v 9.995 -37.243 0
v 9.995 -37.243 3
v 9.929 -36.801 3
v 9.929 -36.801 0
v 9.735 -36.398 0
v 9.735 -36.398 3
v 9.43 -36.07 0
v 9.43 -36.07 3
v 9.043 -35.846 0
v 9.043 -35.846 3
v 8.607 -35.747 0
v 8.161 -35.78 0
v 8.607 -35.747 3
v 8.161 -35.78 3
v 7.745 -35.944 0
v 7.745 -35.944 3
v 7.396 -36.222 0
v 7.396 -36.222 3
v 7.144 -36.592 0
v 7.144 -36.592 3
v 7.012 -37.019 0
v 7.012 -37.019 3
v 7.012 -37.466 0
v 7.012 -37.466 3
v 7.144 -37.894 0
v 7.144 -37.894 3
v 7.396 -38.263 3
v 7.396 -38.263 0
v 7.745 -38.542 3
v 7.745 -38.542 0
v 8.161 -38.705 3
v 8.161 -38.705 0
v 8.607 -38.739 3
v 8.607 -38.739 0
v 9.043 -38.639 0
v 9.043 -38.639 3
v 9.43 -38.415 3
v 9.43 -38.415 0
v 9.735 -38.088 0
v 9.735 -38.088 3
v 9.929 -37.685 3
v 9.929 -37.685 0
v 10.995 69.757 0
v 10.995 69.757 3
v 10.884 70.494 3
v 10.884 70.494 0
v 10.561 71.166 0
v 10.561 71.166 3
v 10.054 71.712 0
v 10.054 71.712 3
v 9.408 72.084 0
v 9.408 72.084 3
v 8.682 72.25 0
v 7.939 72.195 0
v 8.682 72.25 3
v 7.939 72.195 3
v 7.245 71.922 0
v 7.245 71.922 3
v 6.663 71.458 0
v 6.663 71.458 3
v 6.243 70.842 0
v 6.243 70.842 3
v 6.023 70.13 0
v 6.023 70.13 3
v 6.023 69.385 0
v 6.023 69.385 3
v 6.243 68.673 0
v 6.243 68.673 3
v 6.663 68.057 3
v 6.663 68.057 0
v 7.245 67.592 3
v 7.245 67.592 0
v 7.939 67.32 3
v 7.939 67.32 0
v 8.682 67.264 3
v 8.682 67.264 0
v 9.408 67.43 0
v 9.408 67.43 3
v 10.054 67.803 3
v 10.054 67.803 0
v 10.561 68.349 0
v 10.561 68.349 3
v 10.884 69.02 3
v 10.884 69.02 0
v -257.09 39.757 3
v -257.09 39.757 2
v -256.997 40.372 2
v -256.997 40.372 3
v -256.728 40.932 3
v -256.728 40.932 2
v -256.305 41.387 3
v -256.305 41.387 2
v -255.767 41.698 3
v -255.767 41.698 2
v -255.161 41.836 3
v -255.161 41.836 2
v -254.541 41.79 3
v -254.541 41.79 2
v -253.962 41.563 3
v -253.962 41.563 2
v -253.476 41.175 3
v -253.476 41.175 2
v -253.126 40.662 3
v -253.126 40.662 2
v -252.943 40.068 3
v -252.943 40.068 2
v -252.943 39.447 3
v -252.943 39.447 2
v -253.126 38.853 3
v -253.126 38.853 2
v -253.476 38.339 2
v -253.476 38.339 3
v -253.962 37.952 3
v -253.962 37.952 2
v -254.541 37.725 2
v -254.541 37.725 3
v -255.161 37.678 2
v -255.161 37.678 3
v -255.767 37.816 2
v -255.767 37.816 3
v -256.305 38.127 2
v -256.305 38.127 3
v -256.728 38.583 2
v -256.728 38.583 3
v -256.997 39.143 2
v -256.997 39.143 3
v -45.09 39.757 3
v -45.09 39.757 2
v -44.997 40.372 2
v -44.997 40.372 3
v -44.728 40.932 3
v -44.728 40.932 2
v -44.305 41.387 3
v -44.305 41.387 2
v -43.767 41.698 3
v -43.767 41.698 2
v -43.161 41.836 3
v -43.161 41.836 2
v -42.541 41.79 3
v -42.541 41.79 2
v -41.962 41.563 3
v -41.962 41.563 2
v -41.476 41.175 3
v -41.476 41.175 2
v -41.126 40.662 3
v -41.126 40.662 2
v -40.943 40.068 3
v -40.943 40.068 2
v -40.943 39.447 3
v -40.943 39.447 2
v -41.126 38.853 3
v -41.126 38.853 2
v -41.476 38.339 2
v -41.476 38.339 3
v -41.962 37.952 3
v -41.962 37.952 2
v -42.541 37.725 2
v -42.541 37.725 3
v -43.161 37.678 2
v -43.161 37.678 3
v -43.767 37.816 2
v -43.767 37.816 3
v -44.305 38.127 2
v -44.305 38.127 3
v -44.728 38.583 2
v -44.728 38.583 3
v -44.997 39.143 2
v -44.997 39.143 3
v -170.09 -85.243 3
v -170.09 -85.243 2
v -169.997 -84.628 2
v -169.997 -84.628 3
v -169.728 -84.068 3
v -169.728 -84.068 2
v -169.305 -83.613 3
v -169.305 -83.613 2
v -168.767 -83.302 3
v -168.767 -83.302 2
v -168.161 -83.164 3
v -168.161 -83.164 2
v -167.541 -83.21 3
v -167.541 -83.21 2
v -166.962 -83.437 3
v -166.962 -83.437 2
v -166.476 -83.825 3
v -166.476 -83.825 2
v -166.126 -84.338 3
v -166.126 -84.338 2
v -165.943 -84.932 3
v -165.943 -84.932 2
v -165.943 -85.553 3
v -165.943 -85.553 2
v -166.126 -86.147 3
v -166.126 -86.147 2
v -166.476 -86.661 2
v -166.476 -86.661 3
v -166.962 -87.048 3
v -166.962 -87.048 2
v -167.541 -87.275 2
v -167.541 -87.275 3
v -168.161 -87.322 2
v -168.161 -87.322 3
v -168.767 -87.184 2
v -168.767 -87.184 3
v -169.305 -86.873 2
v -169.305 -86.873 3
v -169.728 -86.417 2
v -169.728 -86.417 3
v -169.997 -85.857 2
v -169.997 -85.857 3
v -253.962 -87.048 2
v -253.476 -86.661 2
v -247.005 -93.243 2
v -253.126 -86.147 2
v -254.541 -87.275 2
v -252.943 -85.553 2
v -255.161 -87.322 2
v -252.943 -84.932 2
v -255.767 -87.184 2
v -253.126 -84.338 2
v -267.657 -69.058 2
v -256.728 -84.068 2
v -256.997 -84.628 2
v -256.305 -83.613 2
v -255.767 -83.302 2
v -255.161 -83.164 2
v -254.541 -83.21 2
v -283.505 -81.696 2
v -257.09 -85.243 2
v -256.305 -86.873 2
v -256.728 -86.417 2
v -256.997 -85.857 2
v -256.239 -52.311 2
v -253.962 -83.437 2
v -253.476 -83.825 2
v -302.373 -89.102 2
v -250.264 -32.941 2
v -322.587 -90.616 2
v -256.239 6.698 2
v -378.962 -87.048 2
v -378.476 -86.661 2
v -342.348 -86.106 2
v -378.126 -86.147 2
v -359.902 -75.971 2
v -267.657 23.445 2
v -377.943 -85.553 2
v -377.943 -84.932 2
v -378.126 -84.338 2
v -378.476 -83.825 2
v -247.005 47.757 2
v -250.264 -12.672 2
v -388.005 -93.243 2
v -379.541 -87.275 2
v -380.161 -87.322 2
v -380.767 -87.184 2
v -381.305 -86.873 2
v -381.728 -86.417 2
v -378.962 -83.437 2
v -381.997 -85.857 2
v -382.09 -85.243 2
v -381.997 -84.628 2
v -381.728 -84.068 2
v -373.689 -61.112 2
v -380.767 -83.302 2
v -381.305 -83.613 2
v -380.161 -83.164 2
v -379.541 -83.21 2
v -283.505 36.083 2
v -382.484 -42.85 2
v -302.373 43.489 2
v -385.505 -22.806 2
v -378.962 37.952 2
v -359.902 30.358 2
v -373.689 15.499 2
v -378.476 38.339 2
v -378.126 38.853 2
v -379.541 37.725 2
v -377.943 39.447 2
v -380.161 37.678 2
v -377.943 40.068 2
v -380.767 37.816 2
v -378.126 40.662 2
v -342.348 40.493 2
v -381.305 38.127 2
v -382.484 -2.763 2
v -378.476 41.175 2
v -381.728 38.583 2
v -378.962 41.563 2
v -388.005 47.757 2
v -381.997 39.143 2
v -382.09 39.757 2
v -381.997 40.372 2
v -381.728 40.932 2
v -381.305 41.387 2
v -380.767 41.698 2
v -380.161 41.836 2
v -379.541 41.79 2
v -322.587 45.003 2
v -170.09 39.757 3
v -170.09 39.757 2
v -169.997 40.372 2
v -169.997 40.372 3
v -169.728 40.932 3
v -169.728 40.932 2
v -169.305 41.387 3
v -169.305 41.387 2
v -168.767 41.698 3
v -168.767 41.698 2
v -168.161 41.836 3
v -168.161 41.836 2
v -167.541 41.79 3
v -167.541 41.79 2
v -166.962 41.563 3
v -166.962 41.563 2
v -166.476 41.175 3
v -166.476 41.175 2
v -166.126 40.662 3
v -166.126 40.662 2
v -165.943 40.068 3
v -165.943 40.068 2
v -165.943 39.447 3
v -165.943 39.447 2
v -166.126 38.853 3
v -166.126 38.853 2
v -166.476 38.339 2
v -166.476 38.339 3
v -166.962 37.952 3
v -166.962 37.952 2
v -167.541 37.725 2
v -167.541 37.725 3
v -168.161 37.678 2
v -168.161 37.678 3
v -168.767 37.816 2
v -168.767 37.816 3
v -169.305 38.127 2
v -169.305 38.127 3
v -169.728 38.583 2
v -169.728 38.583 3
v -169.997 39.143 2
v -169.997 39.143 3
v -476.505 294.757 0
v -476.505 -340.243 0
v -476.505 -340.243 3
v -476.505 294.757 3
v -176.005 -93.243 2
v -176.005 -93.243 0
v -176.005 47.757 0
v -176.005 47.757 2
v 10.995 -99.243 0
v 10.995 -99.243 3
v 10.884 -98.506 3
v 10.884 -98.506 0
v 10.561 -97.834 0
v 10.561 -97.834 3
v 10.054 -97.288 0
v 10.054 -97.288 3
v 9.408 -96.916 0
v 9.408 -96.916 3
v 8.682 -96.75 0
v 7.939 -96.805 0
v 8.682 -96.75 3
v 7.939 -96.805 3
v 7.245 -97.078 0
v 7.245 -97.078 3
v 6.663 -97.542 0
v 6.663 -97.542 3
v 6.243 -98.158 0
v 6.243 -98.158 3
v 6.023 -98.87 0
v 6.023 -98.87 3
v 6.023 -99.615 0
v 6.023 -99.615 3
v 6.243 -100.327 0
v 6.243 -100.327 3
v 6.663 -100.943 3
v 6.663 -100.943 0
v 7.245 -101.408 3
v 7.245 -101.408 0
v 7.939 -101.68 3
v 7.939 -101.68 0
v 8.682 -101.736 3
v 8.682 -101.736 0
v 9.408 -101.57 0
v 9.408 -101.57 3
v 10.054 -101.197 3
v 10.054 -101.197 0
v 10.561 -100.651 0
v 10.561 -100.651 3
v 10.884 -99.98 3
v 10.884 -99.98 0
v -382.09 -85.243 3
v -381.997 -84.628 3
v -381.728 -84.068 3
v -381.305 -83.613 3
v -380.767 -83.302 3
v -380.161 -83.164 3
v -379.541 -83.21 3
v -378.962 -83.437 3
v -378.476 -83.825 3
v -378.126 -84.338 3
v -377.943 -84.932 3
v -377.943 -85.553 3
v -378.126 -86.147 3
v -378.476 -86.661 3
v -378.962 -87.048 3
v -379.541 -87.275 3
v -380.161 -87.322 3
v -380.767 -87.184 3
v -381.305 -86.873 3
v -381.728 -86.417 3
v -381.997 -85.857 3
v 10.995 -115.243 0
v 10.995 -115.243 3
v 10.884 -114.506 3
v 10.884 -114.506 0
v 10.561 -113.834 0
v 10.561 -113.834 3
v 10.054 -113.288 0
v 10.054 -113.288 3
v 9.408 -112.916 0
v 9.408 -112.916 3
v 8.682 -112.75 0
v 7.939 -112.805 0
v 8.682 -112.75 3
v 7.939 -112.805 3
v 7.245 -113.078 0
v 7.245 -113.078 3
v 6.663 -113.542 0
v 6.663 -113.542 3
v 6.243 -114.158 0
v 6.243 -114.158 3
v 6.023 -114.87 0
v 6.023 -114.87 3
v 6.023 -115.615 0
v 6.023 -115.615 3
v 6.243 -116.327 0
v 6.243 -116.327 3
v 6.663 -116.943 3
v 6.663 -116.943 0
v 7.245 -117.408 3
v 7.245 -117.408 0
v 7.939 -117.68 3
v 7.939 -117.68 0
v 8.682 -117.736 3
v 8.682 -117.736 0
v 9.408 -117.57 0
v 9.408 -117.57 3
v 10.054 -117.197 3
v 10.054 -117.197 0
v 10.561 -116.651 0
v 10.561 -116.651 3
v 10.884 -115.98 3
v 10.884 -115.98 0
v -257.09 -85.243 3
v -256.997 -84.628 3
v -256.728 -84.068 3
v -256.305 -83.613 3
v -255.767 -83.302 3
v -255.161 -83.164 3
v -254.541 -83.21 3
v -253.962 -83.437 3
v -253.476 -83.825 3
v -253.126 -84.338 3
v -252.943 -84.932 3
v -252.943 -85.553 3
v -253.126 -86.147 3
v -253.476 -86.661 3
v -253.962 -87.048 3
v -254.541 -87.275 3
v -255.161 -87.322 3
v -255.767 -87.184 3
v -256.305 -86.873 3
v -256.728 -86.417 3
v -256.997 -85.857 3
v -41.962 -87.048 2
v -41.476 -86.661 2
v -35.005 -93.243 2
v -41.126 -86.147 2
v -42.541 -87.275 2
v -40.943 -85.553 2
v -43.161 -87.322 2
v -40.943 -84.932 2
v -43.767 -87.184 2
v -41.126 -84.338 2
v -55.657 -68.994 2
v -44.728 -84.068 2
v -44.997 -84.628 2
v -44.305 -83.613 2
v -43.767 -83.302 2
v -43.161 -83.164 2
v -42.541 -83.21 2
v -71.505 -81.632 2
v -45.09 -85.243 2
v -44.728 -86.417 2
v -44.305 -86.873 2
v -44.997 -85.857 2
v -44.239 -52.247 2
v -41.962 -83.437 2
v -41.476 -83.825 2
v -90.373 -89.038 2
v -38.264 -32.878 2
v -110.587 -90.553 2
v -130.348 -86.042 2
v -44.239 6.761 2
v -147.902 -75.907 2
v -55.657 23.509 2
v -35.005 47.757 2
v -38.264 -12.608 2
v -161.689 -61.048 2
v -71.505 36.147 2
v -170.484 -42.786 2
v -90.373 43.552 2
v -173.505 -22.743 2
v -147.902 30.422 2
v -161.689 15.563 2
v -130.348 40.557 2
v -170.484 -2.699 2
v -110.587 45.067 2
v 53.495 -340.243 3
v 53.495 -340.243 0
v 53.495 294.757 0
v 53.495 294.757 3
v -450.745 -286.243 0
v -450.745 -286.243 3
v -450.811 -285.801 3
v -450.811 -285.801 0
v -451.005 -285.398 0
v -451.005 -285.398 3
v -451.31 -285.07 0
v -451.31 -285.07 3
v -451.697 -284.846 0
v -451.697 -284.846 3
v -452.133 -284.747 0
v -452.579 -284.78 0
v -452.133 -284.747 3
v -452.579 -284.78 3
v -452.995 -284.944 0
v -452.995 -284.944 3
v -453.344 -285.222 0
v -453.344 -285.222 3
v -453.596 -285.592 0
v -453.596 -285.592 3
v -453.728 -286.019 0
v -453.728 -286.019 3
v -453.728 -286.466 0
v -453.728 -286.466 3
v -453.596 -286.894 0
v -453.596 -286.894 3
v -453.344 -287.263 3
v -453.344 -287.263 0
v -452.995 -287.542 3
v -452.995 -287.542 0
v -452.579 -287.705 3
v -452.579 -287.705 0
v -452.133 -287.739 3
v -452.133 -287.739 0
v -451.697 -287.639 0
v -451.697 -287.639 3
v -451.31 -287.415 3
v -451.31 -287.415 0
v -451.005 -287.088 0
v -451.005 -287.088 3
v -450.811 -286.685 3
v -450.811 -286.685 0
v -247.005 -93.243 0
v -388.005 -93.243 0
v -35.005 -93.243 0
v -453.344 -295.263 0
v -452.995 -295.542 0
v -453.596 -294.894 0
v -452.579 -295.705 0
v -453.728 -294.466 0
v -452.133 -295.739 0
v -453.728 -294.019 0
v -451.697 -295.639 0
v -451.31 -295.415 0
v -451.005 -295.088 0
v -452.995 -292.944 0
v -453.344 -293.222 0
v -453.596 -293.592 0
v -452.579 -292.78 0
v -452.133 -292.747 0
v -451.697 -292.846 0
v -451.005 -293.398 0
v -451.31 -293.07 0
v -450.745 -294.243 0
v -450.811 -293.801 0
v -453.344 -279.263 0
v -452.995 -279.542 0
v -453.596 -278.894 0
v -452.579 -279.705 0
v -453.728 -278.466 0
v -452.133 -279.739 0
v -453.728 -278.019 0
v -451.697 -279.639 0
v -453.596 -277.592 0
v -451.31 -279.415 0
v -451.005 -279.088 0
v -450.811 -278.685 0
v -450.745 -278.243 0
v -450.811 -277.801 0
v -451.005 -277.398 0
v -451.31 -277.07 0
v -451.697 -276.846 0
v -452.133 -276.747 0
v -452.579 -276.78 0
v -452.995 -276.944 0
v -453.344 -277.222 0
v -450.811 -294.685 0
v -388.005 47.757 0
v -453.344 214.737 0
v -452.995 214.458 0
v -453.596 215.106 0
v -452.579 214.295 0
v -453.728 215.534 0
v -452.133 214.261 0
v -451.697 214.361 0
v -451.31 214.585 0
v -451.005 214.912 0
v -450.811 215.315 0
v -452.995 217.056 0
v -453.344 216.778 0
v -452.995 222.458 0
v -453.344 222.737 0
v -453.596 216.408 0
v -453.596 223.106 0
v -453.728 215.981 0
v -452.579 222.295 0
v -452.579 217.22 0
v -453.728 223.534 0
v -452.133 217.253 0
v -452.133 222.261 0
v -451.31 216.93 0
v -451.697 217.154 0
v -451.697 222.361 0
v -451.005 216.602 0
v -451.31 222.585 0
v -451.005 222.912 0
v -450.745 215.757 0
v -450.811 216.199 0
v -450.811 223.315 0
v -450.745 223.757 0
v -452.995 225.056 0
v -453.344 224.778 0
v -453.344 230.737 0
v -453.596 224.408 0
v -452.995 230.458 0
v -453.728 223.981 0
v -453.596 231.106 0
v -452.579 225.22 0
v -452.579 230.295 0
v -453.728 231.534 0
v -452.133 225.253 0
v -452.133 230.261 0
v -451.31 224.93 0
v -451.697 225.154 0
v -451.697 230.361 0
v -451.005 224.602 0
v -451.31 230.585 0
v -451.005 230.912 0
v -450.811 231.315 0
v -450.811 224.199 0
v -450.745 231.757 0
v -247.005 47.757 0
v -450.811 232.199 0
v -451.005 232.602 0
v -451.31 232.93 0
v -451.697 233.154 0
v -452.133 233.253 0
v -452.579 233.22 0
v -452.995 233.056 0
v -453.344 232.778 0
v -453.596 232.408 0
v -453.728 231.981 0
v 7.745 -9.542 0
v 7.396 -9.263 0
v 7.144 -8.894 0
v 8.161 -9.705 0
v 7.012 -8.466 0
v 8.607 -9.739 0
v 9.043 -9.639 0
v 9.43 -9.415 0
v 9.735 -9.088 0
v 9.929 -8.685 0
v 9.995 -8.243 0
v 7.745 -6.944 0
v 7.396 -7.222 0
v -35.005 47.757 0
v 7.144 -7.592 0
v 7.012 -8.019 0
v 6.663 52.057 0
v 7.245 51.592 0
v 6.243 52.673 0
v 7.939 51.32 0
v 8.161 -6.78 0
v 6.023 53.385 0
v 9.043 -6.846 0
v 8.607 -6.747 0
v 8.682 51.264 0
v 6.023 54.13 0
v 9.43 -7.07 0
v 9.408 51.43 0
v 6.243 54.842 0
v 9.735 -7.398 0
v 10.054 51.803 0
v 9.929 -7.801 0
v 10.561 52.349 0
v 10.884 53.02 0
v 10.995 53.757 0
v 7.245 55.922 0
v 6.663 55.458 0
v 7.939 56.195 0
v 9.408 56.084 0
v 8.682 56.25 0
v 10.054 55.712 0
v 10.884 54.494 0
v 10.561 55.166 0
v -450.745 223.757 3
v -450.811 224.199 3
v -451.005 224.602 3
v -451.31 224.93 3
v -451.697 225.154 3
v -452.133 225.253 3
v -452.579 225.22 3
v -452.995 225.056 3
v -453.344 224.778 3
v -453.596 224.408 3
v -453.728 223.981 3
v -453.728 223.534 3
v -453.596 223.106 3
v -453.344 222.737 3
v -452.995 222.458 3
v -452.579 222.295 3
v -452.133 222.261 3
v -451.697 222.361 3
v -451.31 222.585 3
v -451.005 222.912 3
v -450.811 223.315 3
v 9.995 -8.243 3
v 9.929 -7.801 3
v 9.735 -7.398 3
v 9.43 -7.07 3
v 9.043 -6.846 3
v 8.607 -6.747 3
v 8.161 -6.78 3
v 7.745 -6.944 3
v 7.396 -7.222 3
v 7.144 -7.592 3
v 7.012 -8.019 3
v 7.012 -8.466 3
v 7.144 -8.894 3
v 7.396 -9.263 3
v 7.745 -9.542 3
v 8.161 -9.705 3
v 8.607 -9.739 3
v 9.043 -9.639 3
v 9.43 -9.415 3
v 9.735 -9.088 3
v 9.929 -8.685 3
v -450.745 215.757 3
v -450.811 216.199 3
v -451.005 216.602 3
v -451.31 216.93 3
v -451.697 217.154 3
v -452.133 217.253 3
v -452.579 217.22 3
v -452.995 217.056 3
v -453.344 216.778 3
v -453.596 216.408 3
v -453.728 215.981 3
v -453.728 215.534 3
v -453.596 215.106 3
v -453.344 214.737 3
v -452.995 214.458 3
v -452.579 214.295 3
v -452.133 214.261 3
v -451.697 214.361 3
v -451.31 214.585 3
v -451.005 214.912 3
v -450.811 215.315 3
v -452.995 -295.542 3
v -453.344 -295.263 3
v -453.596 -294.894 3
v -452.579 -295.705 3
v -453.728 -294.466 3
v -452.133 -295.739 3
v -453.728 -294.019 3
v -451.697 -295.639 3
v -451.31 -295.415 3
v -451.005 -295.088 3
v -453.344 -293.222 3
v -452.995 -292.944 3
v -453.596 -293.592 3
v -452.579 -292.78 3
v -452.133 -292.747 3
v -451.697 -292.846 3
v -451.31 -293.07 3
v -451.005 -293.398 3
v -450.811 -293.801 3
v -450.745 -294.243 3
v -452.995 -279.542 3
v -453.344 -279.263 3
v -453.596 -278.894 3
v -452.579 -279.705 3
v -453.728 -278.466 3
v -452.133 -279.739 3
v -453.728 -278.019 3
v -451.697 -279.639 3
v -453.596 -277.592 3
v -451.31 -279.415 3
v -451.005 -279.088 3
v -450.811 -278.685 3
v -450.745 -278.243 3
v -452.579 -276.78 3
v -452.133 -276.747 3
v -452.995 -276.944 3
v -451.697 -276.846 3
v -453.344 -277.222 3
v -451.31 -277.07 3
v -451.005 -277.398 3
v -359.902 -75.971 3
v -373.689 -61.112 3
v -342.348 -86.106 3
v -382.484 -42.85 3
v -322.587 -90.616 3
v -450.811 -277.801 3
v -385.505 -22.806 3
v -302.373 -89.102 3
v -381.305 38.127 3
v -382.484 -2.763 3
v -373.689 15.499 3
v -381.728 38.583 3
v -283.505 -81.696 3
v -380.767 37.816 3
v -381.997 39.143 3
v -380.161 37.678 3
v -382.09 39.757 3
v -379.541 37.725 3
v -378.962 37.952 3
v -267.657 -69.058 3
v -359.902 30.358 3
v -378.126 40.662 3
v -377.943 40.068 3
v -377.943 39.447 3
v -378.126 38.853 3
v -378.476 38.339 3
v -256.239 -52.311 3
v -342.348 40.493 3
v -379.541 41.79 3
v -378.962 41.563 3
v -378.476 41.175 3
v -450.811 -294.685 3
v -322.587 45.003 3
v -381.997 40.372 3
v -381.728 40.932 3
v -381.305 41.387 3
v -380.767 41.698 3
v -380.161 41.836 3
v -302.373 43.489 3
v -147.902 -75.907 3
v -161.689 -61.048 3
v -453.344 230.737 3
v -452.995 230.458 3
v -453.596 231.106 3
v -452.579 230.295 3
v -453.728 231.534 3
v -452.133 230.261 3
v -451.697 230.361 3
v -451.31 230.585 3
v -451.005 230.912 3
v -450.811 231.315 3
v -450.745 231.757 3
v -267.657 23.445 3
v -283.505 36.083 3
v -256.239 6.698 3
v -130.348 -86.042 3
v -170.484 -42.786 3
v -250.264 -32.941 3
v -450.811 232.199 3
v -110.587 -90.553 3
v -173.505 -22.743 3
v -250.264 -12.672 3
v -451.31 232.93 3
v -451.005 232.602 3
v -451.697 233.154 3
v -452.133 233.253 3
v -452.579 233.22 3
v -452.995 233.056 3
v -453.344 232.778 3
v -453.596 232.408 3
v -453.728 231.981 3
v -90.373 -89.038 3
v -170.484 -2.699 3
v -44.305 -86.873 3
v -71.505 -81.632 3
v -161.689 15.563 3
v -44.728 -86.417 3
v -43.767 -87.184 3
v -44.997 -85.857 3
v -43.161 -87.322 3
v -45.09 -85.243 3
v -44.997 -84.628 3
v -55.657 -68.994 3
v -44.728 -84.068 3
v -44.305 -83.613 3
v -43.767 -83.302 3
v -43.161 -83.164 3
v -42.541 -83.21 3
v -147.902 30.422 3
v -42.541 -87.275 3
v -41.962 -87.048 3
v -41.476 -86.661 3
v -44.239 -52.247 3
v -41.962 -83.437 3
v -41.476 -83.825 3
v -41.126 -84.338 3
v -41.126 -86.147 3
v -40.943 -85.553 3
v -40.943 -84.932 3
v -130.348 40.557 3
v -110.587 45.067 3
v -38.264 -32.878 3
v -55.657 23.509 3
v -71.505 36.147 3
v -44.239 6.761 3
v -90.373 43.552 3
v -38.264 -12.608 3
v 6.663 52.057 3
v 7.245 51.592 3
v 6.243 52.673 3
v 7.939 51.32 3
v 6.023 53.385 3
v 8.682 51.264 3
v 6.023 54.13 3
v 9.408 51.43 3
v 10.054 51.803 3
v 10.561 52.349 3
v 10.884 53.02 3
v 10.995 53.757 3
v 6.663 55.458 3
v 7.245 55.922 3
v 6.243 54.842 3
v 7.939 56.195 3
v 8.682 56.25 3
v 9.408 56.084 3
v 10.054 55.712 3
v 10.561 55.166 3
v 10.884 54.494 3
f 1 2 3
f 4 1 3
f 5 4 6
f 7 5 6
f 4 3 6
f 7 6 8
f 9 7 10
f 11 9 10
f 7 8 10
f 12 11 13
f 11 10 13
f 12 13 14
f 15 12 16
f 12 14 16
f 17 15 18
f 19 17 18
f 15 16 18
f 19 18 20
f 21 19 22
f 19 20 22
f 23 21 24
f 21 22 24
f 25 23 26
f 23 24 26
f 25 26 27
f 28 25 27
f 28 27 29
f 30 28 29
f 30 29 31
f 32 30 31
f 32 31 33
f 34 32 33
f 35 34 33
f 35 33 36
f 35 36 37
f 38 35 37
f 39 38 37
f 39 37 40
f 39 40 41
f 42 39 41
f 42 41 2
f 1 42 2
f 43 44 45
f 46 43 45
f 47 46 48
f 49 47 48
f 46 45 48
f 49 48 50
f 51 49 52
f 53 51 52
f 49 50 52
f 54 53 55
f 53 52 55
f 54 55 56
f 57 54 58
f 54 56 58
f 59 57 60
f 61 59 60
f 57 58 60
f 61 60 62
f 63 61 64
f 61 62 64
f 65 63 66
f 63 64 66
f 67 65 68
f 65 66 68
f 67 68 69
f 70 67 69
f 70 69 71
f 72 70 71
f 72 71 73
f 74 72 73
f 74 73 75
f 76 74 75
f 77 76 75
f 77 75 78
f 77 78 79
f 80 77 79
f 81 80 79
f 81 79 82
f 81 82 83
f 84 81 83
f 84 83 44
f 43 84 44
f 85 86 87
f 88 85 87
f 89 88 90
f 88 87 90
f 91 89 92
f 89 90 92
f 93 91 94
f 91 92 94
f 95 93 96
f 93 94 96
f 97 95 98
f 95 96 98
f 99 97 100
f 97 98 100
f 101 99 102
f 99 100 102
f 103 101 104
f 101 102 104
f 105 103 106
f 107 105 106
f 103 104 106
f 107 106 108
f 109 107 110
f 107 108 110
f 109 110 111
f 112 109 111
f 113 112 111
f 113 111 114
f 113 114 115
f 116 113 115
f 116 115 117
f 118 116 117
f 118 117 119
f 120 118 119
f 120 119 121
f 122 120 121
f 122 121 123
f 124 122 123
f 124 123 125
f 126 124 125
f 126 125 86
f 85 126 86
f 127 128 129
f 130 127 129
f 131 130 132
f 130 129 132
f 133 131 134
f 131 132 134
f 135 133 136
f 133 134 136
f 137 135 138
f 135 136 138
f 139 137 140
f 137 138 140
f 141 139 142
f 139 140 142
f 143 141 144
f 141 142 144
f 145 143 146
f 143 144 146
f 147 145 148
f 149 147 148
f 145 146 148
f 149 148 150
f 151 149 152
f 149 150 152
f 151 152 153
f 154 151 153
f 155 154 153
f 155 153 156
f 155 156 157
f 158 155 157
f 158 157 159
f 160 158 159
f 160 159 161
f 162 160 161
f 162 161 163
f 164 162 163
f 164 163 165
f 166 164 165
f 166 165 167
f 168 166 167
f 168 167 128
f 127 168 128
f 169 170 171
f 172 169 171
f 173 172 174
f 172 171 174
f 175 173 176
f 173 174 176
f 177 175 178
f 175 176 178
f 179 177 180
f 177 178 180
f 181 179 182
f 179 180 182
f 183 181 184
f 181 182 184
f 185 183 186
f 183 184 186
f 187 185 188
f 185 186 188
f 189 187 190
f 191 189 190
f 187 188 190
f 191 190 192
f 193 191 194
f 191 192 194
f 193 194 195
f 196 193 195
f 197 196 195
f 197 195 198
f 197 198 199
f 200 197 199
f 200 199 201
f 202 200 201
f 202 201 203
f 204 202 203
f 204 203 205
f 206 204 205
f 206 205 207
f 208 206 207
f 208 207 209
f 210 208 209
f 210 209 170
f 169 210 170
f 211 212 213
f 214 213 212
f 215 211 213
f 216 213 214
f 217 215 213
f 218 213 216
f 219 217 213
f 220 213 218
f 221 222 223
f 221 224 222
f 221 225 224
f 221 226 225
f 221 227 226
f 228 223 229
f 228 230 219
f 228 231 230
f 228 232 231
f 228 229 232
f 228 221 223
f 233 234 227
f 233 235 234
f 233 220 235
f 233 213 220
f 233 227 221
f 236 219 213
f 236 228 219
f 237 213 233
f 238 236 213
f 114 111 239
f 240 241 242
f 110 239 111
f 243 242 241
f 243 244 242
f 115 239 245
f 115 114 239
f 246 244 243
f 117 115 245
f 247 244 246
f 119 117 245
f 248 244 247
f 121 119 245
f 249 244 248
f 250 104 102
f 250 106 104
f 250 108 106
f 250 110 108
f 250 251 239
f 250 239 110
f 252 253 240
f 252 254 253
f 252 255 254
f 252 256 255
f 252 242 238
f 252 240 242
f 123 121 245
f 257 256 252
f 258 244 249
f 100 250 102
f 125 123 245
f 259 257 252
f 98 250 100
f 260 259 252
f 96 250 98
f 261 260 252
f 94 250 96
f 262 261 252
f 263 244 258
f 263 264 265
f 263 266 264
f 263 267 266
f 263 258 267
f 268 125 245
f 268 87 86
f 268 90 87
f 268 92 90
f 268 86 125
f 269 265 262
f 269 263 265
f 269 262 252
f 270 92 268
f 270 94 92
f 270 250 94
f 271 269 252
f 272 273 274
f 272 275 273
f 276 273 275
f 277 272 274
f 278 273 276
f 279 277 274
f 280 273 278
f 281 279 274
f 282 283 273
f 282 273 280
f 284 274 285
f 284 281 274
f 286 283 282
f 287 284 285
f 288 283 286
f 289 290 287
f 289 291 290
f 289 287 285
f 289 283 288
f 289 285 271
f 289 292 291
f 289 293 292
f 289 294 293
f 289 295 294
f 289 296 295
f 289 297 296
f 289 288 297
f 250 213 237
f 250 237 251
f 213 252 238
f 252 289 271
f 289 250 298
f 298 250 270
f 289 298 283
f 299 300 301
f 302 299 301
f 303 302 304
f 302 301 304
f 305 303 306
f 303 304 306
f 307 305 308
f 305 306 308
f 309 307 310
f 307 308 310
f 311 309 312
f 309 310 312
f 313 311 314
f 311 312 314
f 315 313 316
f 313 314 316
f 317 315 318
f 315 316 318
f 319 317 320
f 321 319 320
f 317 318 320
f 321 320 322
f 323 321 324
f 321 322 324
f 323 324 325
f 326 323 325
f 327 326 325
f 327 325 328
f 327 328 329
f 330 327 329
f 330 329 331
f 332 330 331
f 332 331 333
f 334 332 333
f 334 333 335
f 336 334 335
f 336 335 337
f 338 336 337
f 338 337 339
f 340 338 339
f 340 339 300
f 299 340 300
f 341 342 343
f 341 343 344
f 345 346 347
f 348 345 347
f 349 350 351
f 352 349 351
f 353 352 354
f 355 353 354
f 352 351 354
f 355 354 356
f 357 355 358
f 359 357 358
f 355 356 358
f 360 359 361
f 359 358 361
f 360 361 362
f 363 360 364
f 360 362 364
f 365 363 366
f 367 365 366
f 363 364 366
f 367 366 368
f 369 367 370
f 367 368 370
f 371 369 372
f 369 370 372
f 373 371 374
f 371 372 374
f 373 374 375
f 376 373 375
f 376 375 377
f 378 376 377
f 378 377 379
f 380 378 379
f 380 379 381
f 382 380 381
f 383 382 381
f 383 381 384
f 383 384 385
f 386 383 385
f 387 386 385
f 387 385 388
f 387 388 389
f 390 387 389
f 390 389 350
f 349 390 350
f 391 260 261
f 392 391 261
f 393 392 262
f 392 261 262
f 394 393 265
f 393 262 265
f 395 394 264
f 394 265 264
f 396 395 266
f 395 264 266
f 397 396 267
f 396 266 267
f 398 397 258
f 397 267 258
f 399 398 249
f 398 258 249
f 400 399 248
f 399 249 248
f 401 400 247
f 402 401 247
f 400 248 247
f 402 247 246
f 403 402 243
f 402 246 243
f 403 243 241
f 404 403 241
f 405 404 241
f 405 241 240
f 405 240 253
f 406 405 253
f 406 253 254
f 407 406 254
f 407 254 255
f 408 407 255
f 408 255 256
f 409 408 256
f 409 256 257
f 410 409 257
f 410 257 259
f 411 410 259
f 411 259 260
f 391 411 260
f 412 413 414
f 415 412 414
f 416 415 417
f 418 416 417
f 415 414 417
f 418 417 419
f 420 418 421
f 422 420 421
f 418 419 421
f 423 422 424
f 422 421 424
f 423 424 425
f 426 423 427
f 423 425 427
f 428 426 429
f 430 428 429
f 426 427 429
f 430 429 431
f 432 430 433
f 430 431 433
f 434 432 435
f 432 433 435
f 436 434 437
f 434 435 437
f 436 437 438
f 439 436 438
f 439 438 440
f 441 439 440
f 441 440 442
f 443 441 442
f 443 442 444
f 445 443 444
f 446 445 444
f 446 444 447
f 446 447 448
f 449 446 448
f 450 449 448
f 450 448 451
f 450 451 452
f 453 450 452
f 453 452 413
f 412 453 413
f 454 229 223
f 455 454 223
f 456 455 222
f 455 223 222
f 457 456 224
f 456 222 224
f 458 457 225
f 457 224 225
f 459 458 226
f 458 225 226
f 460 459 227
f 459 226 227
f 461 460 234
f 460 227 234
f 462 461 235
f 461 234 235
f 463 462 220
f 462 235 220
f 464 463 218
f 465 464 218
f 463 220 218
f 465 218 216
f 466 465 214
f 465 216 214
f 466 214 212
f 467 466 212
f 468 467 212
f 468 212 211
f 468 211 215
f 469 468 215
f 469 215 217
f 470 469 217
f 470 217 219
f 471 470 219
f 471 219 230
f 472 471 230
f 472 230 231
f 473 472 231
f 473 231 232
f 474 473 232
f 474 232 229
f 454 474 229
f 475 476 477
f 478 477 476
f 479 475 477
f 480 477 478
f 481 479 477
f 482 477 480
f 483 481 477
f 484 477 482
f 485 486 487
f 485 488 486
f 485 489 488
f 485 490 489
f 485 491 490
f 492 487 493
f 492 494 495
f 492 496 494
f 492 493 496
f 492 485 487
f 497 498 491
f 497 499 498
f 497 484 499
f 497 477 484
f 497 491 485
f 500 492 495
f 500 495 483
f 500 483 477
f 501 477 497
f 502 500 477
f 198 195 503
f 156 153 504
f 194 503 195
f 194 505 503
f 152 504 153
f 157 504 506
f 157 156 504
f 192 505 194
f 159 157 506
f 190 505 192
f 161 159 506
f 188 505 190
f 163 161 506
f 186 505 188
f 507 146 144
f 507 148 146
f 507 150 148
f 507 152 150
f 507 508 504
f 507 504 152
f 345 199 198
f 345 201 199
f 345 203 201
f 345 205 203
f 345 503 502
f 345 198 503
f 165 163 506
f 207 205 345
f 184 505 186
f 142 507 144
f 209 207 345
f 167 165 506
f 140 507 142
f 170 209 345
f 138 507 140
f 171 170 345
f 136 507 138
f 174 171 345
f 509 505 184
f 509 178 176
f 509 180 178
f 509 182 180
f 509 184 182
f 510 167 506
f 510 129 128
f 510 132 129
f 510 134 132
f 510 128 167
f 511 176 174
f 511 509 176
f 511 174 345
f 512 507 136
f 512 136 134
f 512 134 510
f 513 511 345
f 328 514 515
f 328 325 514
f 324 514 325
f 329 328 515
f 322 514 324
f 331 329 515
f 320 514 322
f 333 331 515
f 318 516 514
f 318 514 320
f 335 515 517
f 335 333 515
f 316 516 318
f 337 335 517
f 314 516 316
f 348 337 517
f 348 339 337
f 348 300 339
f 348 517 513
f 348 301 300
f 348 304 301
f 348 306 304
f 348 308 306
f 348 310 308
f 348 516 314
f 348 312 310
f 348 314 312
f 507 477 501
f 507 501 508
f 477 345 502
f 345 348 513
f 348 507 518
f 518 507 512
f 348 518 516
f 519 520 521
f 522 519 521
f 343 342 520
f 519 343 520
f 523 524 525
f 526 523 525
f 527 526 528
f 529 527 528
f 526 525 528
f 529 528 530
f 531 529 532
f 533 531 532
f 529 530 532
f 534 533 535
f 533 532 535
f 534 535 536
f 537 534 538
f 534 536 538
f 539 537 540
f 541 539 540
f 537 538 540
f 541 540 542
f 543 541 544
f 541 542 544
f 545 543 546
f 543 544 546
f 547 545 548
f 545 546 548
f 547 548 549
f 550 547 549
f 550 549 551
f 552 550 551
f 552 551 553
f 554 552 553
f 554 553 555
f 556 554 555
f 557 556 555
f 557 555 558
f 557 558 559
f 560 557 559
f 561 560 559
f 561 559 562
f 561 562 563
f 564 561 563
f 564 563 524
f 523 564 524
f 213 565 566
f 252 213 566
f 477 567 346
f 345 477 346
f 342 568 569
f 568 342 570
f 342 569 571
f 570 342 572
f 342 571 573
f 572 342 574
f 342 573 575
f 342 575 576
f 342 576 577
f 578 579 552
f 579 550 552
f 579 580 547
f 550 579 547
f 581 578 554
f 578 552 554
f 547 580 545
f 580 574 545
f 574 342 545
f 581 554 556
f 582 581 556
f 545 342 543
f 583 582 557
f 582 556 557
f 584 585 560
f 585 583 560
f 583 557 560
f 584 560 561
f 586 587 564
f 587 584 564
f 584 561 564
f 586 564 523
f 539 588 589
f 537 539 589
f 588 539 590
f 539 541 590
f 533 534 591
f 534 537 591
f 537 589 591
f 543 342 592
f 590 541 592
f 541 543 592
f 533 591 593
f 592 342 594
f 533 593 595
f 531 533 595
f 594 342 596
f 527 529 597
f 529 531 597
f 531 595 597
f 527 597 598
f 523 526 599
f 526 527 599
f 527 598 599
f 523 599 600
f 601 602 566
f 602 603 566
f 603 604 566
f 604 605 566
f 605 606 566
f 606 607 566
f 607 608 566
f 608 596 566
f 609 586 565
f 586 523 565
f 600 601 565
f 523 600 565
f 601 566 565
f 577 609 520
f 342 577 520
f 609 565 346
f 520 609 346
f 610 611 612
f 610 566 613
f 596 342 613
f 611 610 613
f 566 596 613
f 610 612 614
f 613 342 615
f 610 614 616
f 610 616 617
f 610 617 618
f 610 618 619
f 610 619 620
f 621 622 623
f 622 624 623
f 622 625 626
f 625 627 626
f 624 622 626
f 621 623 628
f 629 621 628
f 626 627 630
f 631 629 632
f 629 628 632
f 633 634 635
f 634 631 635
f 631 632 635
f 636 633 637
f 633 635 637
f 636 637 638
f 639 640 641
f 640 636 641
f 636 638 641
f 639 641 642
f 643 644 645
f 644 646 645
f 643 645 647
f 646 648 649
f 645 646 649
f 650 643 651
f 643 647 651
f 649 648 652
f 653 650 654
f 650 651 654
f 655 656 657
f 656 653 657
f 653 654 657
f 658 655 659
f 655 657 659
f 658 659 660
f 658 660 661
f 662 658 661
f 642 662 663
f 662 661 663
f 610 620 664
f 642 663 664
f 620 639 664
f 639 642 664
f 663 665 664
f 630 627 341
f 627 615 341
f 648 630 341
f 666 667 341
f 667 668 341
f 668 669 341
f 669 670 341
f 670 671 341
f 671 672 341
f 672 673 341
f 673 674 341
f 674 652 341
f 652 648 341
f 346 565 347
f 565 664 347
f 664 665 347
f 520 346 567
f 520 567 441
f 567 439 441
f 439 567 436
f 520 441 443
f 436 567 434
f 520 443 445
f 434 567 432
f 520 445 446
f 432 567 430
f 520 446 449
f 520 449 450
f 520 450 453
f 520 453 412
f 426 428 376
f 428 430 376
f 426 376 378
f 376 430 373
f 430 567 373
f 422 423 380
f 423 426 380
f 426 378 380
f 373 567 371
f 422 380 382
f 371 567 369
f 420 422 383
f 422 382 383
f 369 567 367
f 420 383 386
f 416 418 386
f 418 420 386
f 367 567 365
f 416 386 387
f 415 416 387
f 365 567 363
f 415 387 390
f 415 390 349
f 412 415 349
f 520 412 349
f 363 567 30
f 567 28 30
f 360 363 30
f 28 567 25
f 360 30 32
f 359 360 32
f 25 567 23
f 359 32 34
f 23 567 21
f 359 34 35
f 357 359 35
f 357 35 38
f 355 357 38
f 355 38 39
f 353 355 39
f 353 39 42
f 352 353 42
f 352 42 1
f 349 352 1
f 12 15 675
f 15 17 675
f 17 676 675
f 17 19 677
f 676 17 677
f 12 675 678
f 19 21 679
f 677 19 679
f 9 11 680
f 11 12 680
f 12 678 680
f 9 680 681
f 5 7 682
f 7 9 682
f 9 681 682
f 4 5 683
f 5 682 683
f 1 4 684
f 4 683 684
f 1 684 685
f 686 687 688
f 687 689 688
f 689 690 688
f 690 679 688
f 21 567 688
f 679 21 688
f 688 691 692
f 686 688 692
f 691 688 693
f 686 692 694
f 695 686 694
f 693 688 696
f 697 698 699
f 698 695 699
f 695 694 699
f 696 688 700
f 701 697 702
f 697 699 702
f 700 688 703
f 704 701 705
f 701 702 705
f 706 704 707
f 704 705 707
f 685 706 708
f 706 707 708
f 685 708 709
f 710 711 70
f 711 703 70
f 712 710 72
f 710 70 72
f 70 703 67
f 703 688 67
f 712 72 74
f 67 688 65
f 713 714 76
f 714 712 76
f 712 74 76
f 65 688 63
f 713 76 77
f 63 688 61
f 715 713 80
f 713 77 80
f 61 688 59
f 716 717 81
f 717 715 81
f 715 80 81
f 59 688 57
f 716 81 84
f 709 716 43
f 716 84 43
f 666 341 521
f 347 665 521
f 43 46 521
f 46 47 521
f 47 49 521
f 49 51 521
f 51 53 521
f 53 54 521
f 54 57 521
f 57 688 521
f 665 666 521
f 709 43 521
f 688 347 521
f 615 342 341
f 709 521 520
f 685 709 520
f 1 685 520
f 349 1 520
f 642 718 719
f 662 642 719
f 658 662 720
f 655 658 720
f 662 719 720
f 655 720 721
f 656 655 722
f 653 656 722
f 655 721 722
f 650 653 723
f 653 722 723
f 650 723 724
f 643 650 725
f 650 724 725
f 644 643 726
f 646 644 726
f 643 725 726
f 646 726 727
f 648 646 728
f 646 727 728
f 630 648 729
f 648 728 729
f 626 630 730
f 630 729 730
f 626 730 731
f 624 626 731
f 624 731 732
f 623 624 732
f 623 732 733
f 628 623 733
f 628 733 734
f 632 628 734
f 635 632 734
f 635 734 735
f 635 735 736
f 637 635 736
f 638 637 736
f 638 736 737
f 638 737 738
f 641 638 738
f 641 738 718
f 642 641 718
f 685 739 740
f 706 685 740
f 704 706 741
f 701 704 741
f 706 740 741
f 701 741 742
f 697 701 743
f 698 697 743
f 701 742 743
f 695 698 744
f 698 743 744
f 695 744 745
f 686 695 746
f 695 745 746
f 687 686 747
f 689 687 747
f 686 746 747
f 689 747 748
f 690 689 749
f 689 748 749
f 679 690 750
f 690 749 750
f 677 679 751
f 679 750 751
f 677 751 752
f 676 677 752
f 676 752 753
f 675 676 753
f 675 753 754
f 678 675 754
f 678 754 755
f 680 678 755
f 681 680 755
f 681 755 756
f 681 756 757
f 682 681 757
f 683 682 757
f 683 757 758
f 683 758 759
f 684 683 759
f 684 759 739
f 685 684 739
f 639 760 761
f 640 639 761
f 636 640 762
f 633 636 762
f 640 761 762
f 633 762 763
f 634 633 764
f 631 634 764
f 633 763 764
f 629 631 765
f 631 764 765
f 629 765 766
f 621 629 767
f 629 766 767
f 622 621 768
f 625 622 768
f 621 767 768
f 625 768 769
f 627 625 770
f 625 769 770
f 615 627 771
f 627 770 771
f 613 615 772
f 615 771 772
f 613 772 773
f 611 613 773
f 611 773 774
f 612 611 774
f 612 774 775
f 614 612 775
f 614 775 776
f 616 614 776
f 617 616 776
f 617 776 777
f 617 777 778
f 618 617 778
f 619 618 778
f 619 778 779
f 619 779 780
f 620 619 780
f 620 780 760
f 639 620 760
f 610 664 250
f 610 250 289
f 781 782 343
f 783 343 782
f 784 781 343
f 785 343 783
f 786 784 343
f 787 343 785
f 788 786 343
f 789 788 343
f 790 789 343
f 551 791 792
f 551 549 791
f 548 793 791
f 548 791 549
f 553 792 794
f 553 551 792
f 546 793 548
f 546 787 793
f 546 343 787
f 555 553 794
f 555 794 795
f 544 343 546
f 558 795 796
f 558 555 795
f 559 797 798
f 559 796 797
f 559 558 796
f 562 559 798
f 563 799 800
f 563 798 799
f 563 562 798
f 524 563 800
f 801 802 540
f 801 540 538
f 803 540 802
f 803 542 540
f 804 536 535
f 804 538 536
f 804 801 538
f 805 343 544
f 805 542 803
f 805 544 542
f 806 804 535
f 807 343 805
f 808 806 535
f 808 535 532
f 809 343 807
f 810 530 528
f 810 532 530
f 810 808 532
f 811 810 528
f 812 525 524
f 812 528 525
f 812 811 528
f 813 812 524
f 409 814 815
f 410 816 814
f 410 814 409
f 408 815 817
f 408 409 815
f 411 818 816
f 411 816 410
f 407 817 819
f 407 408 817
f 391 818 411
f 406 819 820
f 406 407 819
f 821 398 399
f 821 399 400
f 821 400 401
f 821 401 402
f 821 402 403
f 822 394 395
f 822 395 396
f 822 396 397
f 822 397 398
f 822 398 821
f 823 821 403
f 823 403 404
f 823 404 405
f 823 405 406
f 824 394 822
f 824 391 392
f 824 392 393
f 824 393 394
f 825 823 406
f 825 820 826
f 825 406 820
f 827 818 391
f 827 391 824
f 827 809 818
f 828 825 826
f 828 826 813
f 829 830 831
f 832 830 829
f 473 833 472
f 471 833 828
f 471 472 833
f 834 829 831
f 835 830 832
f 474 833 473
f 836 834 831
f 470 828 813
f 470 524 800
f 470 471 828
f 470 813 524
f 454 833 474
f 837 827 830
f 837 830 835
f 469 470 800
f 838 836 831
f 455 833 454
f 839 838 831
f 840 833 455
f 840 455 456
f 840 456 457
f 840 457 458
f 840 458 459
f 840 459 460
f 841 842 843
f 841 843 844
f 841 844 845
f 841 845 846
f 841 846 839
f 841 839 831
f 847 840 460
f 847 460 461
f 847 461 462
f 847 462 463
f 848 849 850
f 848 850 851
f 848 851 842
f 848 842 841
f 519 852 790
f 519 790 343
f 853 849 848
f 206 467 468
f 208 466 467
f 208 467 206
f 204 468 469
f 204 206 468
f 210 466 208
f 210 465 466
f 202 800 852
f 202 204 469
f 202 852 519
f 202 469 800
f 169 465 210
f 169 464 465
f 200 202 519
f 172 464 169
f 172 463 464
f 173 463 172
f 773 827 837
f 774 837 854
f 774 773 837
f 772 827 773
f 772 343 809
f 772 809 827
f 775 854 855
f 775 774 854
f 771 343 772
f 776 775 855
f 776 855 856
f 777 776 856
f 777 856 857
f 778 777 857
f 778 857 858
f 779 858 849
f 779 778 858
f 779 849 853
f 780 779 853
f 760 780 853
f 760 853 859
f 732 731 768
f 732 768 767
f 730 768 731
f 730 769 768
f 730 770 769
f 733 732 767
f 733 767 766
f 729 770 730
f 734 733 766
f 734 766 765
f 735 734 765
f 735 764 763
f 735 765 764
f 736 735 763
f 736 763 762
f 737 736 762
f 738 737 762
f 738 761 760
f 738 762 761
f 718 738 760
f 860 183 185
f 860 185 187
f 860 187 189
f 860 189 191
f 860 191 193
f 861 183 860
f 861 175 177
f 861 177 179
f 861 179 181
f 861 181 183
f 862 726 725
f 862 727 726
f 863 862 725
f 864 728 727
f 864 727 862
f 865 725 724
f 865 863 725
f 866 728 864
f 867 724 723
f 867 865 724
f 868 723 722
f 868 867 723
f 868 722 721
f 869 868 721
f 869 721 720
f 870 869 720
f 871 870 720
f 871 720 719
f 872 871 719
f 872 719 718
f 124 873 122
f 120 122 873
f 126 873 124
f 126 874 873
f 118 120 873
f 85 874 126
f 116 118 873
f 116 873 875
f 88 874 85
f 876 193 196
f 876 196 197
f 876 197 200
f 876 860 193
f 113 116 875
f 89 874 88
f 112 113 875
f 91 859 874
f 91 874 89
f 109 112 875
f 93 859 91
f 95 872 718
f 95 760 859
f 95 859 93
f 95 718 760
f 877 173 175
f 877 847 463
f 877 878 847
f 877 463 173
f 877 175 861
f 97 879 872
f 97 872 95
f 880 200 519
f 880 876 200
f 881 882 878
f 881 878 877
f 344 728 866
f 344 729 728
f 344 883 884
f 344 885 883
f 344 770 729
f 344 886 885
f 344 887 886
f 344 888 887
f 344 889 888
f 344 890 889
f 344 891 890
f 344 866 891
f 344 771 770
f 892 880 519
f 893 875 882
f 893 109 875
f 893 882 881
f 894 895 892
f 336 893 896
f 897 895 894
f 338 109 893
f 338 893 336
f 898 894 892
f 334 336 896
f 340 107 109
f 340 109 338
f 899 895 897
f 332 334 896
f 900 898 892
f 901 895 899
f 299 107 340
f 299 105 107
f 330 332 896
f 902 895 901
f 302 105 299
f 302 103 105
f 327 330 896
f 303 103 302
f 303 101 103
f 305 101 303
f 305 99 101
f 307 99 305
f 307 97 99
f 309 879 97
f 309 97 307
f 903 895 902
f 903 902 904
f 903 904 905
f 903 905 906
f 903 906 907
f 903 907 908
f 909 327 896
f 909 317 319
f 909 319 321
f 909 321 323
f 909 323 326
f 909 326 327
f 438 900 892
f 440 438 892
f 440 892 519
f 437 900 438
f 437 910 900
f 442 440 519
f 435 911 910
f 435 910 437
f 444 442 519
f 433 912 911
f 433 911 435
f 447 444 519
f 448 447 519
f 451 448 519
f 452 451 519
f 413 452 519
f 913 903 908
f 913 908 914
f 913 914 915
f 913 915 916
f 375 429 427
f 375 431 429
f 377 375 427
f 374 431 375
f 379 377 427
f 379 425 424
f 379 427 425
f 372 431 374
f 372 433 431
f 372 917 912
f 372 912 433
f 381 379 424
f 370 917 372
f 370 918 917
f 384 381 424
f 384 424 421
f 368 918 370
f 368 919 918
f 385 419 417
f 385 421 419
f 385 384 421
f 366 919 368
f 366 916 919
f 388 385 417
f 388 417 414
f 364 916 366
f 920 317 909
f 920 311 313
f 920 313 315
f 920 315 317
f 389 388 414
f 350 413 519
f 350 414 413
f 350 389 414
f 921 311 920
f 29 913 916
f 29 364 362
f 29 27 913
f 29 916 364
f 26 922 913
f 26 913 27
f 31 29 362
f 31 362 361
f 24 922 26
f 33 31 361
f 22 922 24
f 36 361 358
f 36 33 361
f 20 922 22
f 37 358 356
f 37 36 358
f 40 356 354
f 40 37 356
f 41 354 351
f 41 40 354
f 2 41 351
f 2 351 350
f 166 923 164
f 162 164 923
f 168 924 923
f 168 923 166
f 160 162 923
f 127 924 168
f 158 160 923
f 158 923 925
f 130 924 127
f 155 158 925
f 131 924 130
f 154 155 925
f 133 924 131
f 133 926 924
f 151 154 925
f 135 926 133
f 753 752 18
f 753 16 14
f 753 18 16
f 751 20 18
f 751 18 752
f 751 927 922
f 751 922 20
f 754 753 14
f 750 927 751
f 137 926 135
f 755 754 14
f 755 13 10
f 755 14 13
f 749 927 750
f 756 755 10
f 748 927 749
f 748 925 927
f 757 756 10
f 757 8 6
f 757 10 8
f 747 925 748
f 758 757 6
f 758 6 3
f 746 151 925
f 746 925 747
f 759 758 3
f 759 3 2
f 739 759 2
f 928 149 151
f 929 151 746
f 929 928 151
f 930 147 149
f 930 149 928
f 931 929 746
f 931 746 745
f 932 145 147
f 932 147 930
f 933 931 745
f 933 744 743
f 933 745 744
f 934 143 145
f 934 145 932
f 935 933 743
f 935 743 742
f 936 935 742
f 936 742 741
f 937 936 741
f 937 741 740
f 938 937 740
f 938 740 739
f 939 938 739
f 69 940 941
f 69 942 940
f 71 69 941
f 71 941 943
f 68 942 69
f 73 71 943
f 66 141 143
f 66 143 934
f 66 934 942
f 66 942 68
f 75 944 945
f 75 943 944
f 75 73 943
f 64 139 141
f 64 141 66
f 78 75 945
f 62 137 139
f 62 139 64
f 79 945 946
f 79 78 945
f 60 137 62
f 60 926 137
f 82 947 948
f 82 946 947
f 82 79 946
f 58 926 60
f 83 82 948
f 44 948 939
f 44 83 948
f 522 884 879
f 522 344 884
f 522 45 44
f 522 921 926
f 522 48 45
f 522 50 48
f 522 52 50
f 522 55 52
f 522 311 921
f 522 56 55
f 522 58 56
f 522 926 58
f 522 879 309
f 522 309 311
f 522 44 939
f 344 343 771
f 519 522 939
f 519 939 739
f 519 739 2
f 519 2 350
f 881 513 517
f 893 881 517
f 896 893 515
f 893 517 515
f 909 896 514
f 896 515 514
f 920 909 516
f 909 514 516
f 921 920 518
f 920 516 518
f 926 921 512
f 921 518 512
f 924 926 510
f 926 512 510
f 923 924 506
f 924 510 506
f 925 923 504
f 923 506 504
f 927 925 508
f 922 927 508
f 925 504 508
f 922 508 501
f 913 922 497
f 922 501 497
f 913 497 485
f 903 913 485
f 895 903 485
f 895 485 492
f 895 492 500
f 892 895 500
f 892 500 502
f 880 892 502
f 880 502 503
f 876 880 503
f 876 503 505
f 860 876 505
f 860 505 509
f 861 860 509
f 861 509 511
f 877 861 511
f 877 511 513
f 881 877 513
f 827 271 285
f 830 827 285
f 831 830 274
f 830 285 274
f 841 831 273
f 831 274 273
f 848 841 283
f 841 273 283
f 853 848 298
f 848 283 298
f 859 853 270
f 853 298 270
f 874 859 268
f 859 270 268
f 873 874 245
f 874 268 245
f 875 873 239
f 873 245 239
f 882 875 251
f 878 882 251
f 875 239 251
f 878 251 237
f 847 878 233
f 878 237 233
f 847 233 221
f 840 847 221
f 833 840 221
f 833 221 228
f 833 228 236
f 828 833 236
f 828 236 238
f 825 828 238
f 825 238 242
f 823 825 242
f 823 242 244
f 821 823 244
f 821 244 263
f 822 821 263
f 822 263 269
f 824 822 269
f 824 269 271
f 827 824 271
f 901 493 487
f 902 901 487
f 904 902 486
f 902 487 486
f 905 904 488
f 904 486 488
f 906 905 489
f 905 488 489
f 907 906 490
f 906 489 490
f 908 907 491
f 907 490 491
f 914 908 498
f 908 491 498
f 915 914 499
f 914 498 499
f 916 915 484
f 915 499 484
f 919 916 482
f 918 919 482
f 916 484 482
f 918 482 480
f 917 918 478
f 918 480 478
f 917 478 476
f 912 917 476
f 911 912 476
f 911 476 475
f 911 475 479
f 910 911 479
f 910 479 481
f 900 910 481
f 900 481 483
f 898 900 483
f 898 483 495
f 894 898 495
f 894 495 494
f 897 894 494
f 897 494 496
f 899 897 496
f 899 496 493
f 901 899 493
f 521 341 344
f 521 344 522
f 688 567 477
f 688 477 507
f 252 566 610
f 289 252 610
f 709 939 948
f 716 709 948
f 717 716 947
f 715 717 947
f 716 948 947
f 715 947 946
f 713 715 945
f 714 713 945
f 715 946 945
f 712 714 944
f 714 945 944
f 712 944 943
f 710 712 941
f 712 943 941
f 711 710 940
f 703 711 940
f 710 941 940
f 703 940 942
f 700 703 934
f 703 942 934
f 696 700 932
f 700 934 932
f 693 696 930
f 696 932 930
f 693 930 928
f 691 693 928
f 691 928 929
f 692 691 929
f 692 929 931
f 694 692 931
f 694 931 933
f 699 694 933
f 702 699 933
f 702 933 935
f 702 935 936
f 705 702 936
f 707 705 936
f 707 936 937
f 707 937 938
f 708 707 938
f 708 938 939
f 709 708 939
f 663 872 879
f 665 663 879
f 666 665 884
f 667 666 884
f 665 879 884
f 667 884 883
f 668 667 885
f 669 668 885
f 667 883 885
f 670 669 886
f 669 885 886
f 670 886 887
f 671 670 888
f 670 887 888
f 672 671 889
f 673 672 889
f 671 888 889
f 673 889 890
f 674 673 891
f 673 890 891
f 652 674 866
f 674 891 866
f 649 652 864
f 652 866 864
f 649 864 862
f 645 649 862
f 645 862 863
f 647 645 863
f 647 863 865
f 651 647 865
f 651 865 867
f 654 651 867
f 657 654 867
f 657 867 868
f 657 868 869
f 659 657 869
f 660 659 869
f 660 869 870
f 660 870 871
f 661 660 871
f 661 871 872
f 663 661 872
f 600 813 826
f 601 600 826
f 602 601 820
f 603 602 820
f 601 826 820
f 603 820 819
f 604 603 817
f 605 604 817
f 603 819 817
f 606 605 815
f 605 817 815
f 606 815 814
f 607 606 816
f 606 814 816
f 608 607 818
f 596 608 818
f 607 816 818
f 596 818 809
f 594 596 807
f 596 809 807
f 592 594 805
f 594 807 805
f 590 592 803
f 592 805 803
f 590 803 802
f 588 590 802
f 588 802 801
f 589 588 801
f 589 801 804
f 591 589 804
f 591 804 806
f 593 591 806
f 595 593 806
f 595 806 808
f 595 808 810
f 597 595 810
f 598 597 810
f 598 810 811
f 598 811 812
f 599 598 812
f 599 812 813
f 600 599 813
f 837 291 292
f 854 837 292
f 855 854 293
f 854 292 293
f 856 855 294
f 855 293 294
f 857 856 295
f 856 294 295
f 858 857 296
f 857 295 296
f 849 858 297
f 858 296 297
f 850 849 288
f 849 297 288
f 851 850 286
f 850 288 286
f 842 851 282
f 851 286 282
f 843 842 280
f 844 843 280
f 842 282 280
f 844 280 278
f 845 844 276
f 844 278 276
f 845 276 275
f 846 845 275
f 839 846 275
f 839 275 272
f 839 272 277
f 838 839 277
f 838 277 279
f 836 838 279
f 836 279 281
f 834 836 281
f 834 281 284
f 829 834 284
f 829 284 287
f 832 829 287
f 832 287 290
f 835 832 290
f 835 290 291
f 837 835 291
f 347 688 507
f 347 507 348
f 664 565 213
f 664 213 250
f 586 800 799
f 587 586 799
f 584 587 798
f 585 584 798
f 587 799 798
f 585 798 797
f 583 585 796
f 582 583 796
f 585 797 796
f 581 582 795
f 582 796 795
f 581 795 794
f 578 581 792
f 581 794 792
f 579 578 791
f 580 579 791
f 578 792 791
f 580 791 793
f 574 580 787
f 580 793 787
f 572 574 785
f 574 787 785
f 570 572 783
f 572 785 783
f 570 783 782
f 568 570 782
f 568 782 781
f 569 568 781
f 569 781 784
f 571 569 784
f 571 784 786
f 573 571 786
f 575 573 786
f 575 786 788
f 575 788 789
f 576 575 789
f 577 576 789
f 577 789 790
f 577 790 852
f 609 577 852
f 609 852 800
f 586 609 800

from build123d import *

# Parameters (mm, degrees)
SKETCH1_W           = 530
SKETCH1_H           = 635
BOSS_EXTRUDE1_DEPTH = 3
SKETCH2_R           = 1.5
CUT_EXTRUDE1_DEPTH  = 586.517705704
SKETCH3_R           = 2.5
SKETCH3_R_2         = 1.5
CUT_EXTRUDE2_DEPTH  = 586.517705704
SKETCH13_W          = 141
SKETCH13_H          = 141
CUT_EXTRUDE20_DEPTH = 2
SKETCH14_R          = 2.085
SKETCH14_R_2        = 68
CUT_EXTRUDE21_DEPTH = 586.513435963
SKETCH15_R          = 2.085
SKETCH15_R_2        = 68
CUT_EXTRUDE22_DEPTH = 586.513435963


with BuildPart() as part:
    # Sketch1 → Boss-Extrude1 (new body)
    with BuildSketch(Plane.XY):
        with Locations((-211.504854369, -22.742718447)):
            Rectangle(SKETCH1_W, SKETCH1_H)
    extrude(amount=BOSS_EXTRUDE1_DEPTH)

    # Sketch2 → Cut-Extrude1 (cut, through all)
    with BuildSketch(Plane.XY.offset(3)):
        with Locations((-452.244854369, 231.757281553)):
            Circle(SKETCH2_R)
        with Locations((-452.244854369, 223.757281553)):
            Circle(SKETCH2_R)
        with Locations((-452.244854369, 215.757281553)):
            Circle(SKETCH2_R)
        with Locations((-452.244854369, -278.242718447)):
            Circle(SKETCH2_R)
        with Locations((-452.244854369, -286.242718447)):
            Circle(SKETCH2_R)
        with Locations((-452.244854369, -294.242718447)):
            Circle(SKETCH2_R)
    extrude(amount=-CUT_EXTRUDE1_DEPTH, mode=Mode.SUBTRACT)

    # Sketch3 → Cut-Extrude2 (cut, through all)
    with BuildSketch(Plane.XY.offset(3)):
        with Locations((8.495145631, 69.757281553)):
            Circle(SKETCH3_R)
        with Locations((8.495145631, 53.757281553)):
            Circle(SKETCH3_R)
        with Locations((8.495145631, -99.242718447)):
            Circle(SKETCH3_R)
        with Locations((8.495145631, -115.242718447)):
            Circle(SKETCH3_R)
        with Locations((8.495145631, -8.242718447)):
            Circle(SKETCH3_R_2)
        with Locations((8.495145631, -37.242718447)):
            Circle(SKETCH3_R_2)
    extrude(amount=-CUT_EXTRUDE2_DEPTH, mode=Mode.SUBTRACT)

    # Sketch13 → Cut-Extrude20 (cut)
    with BuildSketch(Plane(origin=(0, 0, 0), x_dir=(-1, 0, 0), z_dir=(0, 0, -1))):
        with Locations((105.504854369, -22.742718447)):
            Rectangle(SKETCH13_W, SKETCH13_H)
        with Locations((317.504854369, -22.742718447)):
            Rectangle(SKETCH13_W, SKETCH13_H)
    extrude(amount=-CUT_EXTRUDE20_DEPTH, mode=Mode.SUBTRACT)

    # Sketch14 → Cut-Extrude21 (cut, through all)
    with BuildSketch(Plane(origin=(0, 0, 2), x_dir=(-1, 0, 0), z_dir=(0, 0, -1))):
        with Locations((43.004854369, 39.757281553)):
            Circle(SKETCH14_R)
        with Locations((168.004854369, 39.757281553)):
            Circle(SKETCH14_R)
        with Locations((43.004854369, -85.242718447)):
            Circle(SKETCH14_R)
        with Locations((168.004854369, -85.242718447)):
            Circle(SKETCH14_R)
        with Locations((105.504854369, -22.742718447)):
            Circle(SKETCH14_R_2)
    extrude(amount=-CUT_EXTRUDE21_DEPTH, mode=Mode.SUBTRACT)

    # Sketch15 → Cut-Extrude22 (cut, through all)
    with BuildSketch(Plane(origin=(0, 0, 2), x_dir=(-1, 0, 0), z_dir=(0, 0, -1))):
        with Locations((255.004854369, 39.757281553)):
            Circle(SKETCH15_R)
        with Locations((380.004854369, 39.757281553)):
            Circle(SKETCH15_R)
        with Locations((255.004854369, -85.242718447)):
            Circle(SKETCH15_R)
        with Locations((380.004854369, -85.242718447)):
            Circle(SKETCH15_R)
        with Locations((317.504854369, -22.80647888)):
            Circle(SKETCH15_R_2)
    extrude(amount=-CUT_EXTRUDE22_DEPTH, mode=Mode.SUBTRACT)


solid = part.part
